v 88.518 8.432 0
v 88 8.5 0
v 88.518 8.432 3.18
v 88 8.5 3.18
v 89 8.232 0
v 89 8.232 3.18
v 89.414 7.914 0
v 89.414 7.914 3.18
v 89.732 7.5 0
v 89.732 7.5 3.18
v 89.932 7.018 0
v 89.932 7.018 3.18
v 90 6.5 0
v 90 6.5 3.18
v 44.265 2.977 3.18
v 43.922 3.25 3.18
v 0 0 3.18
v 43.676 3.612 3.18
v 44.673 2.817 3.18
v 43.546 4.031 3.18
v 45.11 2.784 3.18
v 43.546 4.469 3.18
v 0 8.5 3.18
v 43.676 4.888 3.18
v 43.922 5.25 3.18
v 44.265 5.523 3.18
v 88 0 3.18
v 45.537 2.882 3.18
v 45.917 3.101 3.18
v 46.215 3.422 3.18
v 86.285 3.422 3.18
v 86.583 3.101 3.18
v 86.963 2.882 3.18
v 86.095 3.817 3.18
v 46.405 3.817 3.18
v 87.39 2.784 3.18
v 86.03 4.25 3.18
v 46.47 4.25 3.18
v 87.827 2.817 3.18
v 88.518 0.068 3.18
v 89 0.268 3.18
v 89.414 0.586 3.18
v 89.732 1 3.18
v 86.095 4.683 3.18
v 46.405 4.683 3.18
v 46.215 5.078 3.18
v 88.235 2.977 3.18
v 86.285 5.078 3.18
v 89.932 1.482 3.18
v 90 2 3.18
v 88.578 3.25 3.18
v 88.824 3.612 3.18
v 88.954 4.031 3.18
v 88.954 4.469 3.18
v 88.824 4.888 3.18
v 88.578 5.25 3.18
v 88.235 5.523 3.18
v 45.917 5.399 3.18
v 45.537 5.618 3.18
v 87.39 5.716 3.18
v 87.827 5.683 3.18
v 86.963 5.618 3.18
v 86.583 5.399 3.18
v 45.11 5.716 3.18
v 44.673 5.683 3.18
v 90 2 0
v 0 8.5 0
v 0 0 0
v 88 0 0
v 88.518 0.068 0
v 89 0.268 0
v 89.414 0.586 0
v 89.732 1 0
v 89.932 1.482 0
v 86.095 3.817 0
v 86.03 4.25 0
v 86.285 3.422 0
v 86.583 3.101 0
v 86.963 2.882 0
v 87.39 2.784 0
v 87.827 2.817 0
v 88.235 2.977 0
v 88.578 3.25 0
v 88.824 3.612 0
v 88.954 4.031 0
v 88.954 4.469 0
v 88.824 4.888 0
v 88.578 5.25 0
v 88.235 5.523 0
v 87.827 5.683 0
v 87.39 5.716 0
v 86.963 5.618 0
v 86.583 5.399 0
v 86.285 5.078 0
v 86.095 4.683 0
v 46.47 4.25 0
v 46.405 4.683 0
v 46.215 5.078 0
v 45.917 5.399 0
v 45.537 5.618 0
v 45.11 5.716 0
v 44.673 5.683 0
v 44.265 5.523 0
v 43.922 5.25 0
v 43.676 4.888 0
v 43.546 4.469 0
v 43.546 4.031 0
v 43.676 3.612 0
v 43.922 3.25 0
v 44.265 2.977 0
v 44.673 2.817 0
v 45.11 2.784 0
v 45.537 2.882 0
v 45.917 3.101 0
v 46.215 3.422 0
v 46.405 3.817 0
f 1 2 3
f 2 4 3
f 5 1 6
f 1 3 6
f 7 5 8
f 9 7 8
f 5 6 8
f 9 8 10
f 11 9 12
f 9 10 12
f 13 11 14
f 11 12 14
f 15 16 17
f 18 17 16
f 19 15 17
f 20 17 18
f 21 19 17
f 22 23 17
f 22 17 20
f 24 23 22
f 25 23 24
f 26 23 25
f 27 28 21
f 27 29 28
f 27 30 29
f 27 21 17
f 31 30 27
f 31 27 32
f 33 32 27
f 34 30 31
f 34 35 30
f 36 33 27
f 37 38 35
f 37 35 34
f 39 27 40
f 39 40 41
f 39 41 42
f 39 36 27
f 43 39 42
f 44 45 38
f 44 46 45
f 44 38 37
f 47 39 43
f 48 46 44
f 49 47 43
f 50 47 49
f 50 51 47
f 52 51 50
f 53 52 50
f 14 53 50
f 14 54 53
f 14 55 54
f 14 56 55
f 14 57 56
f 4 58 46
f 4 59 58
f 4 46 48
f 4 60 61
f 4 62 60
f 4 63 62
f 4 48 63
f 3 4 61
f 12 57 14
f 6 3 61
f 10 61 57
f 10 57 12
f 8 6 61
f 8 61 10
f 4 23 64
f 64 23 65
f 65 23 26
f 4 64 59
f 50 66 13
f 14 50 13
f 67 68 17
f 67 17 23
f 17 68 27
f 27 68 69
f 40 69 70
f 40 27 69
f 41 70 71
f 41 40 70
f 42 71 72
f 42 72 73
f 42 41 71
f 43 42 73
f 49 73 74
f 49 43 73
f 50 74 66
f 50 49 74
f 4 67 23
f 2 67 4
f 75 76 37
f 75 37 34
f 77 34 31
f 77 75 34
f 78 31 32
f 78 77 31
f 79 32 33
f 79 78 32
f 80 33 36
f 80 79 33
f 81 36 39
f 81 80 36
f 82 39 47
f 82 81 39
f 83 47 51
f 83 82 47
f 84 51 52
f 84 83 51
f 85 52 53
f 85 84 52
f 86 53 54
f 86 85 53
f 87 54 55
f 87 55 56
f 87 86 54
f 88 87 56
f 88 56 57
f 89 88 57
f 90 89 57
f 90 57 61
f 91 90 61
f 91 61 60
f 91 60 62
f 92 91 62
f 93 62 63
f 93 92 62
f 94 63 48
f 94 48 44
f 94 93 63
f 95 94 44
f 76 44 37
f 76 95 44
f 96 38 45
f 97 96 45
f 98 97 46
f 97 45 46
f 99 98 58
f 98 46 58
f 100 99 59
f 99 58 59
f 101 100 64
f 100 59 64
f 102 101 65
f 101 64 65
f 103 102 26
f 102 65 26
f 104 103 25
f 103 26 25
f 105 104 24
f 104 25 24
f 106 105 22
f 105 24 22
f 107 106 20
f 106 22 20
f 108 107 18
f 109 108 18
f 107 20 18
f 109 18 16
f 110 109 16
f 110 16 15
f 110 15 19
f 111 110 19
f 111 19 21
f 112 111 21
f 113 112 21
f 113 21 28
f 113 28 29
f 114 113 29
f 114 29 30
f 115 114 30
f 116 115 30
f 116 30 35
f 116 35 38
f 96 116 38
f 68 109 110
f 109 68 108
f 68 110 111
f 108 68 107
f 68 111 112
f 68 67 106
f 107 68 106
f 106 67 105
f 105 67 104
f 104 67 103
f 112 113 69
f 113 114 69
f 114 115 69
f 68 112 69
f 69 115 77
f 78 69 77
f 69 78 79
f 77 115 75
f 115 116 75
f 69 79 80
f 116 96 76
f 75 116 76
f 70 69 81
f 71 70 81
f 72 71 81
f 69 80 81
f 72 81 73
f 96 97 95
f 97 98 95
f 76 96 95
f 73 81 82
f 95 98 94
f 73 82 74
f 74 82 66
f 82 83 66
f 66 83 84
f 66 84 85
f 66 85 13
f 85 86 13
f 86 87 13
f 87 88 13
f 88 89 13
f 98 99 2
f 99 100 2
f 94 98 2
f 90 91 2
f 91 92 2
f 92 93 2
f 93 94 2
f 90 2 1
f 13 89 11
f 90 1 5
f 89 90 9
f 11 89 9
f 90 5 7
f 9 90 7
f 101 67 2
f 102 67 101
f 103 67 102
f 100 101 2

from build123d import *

# Parameters (mm, degrees)
SKETCH1_W           = 90
SKETCH1_H           = 8.5
SKETCH1_R           = 1.47
BOSS_EXTRUDE1_DEPTH = 3.18
SKETCH2_R           = 1.47
CUT_EXTRUDE1_DEPTH  = 91.456411602
FILLET1_R           = 2


with BuildPart() as part:
    # Sketch1 → Boss-Extrude1 (new body)
    with BuildSketch(Plane.XY):
        with Locations((45, 4.25)):
            Rectangle(SKETCH1_W, SKETCH1_H)
        with Locations(Location((87.5, 4.25, 0), (0, 0, 180))):
            Circle(SKETCH1_R, mode=Mode.SUBTRACT)
    extrude(amount=BOSS_EXTRUDE1_DEPTH)

    # Sketch2 → Cut-Extrude1 (cut, through all)
    with BuildSketch(Plane.XY.offset(3.18)):
        with Locations((45, 4.25)):
            Circle(SKETCH2_R)
    extrude(amount=-CUT_EXTRUDE1_DEPTH, mode=Mode.SUBTRACT)

    # Fillet1
    fillet1_edges = [part.edges().sort_by_distance(p)[0] for p in [
        (90, 8.5, 1.59),
        (90, 0, 1.59),
    ]]
    fillet(fillet1_edges, radius=FILLET1_R)


solid = part.part
